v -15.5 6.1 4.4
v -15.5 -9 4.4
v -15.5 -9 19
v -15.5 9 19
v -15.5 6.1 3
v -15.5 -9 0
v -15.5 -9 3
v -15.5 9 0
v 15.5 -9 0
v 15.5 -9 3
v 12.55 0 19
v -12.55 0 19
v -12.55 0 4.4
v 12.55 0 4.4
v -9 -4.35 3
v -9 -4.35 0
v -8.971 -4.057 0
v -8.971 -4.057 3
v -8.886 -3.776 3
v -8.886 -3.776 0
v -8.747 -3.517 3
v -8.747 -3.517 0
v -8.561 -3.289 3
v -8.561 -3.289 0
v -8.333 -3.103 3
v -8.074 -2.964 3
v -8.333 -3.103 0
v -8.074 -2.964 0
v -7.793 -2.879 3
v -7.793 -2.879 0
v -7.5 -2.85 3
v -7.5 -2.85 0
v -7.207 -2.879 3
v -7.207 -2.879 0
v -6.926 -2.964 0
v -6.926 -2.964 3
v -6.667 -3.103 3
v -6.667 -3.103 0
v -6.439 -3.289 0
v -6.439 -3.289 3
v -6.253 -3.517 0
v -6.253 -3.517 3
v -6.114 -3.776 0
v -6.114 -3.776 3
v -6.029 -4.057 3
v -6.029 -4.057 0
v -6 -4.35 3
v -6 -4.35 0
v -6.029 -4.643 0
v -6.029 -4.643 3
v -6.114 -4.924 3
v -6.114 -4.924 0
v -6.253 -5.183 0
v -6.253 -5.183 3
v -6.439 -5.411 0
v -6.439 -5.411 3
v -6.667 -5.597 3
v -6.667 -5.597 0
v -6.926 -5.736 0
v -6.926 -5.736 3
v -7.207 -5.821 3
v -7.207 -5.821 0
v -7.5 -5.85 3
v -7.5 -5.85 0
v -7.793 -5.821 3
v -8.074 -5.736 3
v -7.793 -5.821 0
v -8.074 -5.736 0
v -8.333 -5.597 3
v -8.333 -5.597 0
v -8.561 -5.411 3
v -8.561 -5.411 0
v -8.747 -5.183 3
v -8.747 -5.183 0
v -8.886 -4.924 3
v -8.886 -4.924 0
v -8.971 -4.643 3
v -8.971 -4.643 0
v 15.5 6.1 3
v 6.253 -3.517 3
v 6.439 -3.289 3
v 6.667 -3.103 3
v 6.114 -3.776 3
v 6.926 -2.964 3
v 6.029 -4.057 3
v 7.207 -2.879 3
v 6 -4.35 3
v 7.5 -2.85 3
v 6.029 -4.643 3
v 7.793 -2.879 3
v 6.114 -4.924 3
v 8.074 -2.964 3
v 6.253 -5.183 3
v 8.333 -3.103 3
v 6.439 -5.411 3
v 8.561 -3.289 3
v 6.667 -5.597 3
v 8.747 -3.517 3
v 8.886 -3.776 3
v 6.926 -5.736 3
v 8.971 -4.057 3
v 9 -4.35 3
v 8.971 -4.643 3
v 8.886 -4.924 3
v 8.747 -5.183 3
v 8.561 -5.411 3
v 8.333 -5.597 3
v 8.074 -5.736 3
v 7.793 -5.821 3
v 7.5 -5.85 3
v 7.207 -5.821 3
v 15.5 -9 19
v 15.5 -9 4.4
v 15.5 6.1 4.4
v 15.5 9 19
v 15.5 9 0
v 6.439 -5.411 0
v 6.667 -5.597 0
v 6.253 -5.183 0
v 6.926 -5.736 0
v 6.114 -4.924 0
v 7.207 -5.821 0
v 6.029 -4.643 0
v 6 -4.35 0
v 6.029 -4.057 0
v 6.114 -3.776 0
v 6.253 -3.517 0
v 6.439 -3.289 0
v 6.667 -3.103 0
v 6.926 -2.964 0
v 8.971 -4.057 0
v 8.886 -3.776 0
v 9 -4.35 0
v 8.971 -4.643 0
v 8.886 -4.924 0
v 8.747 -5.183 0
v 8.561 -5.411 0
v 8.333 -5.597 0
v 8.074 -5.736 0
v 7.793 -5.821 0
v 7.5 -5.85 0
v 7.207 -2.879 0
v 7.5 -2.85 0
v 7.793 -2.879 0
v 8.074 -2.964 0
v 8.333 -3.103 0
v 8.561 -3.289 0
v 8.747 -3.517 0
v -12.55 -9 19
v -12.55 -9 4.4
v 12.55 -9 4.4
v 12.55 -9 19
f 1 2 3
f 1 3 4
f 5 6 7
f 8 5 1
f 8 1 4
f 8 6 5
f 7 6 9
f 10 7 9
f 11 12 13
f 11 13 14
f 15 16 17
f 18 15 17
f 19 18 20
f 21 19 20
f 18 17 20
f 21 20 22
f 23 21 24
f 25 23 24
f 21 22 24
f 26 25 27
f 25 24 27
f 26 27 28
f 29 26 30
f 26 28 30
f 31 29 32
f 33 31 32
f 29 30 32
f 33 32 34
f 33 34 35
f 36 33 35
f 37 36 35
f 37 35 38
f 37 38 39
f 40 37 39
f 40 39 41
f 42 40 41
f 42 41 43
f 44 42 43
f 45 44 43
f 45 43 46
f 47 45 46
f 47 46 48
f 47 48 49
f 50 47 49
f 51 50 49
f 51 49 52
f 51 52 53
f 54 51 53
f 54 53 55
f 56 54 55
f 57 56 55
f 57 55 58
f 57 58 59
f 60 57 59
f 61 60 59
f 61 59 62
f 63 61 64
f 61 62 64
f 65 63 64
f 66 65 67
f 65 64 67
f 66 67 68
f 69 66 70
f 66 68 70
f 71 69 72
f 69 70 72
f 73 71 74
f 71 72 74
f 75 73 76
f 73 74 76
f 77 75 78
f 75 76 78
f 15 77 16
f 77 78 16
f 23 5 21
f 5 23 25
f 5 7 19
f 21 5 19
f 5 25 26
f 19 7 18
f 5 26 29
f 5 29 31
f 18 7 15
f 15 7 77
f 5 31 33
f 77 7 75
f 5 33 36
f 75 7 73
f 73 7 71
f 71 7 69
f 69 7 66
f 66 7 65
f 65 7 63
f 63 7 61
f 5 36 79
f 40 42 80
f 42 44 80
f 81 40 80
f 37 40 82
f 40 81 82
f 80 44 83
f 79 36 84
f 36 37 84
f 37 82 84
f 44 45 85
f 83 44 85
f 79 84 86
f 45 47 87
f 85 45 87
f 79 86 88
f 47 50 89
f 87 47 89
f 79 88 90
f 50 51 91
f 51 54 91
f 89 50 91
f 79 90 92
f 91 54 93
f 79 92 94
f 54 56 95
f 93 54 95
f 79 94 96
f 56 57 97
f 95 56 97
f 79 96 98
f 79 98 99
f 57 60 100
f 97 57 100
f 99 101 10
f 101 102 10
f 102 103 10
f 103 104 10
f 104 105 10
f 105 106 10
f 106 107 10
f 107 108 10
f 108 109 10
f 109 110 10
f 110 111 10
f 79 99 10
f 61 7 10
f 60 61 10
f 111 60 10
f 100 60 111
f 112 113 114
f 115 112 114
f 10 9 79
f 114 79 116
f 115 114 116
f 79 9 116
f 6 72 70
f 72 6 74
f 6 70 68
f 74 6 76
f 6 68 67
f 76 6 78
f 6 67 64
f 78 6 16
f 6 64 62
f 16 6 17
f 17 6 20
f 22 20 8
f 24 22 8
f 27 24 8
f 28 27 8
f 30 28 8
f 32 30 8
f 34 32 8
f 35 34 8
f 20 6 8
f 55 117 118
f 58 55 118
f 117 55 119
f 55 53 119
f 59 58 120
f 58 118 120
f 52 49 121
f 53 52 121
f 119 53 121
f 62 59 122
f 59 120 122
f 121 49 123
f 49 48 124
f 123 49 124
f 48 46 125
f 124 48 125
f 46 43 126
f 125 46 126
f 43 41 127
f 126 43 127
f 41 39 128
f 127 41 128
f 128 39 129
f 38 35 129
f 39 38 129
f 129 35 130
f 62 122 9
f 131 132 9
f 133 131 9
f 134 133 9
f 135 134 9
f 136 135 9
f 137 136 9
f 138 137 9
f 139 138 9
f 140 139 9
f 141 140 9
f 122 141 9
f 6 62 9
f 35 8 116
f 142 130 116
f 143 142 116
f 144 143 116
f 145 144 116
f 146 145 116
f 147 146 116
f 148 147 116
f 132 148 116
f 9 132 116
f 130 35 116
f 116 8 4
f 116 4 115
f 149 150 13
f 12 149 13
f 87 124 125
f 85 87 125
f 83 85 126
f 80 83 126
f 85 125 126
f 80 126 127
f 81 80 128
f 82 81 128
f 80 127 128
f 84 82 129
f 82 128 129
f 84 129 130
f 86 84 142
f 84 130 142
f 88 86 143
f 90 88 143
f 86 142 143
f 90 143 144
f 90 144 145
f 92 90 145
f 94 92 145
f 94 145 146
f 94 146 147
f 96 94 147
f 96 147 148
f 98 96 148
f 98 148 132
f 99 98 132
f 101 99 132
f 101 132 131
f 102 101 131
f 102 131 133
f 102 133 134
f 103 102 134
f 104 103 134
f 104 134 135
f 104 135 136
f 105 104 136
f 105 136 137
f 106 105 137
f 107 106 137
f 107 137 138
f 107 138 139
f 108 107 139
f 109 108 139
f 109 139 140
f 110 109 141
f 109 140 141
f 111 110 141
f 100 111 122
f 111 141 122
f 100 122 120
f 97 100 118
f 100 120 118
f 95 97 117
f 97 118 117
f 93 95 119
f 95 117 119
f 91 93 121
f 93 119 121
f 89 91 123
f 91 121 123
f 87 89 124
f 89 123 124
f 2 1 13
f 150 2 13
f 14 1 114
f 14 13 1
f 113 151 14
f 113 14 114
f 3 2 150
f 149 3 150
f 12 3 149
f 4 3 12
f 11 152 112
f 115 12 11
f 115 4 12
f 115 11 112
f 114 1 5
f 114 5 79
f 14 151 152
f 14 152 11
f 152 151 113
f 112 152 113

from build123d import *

# Parameters (mm, degrees)
CROQUIS1_W              = 31
CROQUIS1_H              = 18
SALIENTE_EXTRUIR1_DEPTH = 19
CROQUIS3_W              = 25.1
CROQUIS3_H              = 9
CORTAR_EXTRUIR1_DEPTH   = 16
CROQUIS4_W              = 31
CROQUIS4_H              = 1.4
CORTAR_EXTRUIR2_DEPTH   = 15.1
CROQUIS5_R              = 1.5
CORTAR_EXTRUIR3_DEPTH   = 20


with BuildPart() as part:
    # Croquis1 → Saliente-Extruir1 (new body)
    with BuildSketch(Plane.XY):
        Rectangle(CROQUIS1_W, CROQUIS1_H)
    extrude(amount=SALIENTE_EXTRUIR1_DEPTH)

    # Croquis3 → Cortar-Extruir1 (cut)
    with BuildSketch(Plane.XY.offset(19)):
        with Locations((0, -4.5)):
            Rectangle(CROQUIS3_W, CROQUIS3_H)
    extrude(amount=-CORTAR_EXTRUIR1_DEPTH, mode=Mode.SUBTRACT)

    # Croquis4 → Cortar-Extruir2 (cut)
    with BuildSketch(Plane.XZ.offset(9)):
        with Locations((0, 3.7)):
            Rectangle(CROQUIS4_W, CROQUIS4_H)
    extrude(amount=-CORTAR_EXTRUIR2_DEPTH, mode=Mode.SUBTRACT)

    # Croquis5 → Cortar-Extruir3 (cut, through all)
    with BuildSketch(Plane(origin=(0, 0, 0), x_dir=(-1, 0, 0), z_dir=(0, 0, -1))):
        with Locations((-7.5, -4.35)):
            Circle(CROQUIS5_R)
        with Locations((7.5, -4.35)):
            Circle(CROQUIS5_R)
    extrude(amount=-CORTAR_EXTRUIR3_DEPTH, mode=Mode.SUBTRACT)


solid = part.part
